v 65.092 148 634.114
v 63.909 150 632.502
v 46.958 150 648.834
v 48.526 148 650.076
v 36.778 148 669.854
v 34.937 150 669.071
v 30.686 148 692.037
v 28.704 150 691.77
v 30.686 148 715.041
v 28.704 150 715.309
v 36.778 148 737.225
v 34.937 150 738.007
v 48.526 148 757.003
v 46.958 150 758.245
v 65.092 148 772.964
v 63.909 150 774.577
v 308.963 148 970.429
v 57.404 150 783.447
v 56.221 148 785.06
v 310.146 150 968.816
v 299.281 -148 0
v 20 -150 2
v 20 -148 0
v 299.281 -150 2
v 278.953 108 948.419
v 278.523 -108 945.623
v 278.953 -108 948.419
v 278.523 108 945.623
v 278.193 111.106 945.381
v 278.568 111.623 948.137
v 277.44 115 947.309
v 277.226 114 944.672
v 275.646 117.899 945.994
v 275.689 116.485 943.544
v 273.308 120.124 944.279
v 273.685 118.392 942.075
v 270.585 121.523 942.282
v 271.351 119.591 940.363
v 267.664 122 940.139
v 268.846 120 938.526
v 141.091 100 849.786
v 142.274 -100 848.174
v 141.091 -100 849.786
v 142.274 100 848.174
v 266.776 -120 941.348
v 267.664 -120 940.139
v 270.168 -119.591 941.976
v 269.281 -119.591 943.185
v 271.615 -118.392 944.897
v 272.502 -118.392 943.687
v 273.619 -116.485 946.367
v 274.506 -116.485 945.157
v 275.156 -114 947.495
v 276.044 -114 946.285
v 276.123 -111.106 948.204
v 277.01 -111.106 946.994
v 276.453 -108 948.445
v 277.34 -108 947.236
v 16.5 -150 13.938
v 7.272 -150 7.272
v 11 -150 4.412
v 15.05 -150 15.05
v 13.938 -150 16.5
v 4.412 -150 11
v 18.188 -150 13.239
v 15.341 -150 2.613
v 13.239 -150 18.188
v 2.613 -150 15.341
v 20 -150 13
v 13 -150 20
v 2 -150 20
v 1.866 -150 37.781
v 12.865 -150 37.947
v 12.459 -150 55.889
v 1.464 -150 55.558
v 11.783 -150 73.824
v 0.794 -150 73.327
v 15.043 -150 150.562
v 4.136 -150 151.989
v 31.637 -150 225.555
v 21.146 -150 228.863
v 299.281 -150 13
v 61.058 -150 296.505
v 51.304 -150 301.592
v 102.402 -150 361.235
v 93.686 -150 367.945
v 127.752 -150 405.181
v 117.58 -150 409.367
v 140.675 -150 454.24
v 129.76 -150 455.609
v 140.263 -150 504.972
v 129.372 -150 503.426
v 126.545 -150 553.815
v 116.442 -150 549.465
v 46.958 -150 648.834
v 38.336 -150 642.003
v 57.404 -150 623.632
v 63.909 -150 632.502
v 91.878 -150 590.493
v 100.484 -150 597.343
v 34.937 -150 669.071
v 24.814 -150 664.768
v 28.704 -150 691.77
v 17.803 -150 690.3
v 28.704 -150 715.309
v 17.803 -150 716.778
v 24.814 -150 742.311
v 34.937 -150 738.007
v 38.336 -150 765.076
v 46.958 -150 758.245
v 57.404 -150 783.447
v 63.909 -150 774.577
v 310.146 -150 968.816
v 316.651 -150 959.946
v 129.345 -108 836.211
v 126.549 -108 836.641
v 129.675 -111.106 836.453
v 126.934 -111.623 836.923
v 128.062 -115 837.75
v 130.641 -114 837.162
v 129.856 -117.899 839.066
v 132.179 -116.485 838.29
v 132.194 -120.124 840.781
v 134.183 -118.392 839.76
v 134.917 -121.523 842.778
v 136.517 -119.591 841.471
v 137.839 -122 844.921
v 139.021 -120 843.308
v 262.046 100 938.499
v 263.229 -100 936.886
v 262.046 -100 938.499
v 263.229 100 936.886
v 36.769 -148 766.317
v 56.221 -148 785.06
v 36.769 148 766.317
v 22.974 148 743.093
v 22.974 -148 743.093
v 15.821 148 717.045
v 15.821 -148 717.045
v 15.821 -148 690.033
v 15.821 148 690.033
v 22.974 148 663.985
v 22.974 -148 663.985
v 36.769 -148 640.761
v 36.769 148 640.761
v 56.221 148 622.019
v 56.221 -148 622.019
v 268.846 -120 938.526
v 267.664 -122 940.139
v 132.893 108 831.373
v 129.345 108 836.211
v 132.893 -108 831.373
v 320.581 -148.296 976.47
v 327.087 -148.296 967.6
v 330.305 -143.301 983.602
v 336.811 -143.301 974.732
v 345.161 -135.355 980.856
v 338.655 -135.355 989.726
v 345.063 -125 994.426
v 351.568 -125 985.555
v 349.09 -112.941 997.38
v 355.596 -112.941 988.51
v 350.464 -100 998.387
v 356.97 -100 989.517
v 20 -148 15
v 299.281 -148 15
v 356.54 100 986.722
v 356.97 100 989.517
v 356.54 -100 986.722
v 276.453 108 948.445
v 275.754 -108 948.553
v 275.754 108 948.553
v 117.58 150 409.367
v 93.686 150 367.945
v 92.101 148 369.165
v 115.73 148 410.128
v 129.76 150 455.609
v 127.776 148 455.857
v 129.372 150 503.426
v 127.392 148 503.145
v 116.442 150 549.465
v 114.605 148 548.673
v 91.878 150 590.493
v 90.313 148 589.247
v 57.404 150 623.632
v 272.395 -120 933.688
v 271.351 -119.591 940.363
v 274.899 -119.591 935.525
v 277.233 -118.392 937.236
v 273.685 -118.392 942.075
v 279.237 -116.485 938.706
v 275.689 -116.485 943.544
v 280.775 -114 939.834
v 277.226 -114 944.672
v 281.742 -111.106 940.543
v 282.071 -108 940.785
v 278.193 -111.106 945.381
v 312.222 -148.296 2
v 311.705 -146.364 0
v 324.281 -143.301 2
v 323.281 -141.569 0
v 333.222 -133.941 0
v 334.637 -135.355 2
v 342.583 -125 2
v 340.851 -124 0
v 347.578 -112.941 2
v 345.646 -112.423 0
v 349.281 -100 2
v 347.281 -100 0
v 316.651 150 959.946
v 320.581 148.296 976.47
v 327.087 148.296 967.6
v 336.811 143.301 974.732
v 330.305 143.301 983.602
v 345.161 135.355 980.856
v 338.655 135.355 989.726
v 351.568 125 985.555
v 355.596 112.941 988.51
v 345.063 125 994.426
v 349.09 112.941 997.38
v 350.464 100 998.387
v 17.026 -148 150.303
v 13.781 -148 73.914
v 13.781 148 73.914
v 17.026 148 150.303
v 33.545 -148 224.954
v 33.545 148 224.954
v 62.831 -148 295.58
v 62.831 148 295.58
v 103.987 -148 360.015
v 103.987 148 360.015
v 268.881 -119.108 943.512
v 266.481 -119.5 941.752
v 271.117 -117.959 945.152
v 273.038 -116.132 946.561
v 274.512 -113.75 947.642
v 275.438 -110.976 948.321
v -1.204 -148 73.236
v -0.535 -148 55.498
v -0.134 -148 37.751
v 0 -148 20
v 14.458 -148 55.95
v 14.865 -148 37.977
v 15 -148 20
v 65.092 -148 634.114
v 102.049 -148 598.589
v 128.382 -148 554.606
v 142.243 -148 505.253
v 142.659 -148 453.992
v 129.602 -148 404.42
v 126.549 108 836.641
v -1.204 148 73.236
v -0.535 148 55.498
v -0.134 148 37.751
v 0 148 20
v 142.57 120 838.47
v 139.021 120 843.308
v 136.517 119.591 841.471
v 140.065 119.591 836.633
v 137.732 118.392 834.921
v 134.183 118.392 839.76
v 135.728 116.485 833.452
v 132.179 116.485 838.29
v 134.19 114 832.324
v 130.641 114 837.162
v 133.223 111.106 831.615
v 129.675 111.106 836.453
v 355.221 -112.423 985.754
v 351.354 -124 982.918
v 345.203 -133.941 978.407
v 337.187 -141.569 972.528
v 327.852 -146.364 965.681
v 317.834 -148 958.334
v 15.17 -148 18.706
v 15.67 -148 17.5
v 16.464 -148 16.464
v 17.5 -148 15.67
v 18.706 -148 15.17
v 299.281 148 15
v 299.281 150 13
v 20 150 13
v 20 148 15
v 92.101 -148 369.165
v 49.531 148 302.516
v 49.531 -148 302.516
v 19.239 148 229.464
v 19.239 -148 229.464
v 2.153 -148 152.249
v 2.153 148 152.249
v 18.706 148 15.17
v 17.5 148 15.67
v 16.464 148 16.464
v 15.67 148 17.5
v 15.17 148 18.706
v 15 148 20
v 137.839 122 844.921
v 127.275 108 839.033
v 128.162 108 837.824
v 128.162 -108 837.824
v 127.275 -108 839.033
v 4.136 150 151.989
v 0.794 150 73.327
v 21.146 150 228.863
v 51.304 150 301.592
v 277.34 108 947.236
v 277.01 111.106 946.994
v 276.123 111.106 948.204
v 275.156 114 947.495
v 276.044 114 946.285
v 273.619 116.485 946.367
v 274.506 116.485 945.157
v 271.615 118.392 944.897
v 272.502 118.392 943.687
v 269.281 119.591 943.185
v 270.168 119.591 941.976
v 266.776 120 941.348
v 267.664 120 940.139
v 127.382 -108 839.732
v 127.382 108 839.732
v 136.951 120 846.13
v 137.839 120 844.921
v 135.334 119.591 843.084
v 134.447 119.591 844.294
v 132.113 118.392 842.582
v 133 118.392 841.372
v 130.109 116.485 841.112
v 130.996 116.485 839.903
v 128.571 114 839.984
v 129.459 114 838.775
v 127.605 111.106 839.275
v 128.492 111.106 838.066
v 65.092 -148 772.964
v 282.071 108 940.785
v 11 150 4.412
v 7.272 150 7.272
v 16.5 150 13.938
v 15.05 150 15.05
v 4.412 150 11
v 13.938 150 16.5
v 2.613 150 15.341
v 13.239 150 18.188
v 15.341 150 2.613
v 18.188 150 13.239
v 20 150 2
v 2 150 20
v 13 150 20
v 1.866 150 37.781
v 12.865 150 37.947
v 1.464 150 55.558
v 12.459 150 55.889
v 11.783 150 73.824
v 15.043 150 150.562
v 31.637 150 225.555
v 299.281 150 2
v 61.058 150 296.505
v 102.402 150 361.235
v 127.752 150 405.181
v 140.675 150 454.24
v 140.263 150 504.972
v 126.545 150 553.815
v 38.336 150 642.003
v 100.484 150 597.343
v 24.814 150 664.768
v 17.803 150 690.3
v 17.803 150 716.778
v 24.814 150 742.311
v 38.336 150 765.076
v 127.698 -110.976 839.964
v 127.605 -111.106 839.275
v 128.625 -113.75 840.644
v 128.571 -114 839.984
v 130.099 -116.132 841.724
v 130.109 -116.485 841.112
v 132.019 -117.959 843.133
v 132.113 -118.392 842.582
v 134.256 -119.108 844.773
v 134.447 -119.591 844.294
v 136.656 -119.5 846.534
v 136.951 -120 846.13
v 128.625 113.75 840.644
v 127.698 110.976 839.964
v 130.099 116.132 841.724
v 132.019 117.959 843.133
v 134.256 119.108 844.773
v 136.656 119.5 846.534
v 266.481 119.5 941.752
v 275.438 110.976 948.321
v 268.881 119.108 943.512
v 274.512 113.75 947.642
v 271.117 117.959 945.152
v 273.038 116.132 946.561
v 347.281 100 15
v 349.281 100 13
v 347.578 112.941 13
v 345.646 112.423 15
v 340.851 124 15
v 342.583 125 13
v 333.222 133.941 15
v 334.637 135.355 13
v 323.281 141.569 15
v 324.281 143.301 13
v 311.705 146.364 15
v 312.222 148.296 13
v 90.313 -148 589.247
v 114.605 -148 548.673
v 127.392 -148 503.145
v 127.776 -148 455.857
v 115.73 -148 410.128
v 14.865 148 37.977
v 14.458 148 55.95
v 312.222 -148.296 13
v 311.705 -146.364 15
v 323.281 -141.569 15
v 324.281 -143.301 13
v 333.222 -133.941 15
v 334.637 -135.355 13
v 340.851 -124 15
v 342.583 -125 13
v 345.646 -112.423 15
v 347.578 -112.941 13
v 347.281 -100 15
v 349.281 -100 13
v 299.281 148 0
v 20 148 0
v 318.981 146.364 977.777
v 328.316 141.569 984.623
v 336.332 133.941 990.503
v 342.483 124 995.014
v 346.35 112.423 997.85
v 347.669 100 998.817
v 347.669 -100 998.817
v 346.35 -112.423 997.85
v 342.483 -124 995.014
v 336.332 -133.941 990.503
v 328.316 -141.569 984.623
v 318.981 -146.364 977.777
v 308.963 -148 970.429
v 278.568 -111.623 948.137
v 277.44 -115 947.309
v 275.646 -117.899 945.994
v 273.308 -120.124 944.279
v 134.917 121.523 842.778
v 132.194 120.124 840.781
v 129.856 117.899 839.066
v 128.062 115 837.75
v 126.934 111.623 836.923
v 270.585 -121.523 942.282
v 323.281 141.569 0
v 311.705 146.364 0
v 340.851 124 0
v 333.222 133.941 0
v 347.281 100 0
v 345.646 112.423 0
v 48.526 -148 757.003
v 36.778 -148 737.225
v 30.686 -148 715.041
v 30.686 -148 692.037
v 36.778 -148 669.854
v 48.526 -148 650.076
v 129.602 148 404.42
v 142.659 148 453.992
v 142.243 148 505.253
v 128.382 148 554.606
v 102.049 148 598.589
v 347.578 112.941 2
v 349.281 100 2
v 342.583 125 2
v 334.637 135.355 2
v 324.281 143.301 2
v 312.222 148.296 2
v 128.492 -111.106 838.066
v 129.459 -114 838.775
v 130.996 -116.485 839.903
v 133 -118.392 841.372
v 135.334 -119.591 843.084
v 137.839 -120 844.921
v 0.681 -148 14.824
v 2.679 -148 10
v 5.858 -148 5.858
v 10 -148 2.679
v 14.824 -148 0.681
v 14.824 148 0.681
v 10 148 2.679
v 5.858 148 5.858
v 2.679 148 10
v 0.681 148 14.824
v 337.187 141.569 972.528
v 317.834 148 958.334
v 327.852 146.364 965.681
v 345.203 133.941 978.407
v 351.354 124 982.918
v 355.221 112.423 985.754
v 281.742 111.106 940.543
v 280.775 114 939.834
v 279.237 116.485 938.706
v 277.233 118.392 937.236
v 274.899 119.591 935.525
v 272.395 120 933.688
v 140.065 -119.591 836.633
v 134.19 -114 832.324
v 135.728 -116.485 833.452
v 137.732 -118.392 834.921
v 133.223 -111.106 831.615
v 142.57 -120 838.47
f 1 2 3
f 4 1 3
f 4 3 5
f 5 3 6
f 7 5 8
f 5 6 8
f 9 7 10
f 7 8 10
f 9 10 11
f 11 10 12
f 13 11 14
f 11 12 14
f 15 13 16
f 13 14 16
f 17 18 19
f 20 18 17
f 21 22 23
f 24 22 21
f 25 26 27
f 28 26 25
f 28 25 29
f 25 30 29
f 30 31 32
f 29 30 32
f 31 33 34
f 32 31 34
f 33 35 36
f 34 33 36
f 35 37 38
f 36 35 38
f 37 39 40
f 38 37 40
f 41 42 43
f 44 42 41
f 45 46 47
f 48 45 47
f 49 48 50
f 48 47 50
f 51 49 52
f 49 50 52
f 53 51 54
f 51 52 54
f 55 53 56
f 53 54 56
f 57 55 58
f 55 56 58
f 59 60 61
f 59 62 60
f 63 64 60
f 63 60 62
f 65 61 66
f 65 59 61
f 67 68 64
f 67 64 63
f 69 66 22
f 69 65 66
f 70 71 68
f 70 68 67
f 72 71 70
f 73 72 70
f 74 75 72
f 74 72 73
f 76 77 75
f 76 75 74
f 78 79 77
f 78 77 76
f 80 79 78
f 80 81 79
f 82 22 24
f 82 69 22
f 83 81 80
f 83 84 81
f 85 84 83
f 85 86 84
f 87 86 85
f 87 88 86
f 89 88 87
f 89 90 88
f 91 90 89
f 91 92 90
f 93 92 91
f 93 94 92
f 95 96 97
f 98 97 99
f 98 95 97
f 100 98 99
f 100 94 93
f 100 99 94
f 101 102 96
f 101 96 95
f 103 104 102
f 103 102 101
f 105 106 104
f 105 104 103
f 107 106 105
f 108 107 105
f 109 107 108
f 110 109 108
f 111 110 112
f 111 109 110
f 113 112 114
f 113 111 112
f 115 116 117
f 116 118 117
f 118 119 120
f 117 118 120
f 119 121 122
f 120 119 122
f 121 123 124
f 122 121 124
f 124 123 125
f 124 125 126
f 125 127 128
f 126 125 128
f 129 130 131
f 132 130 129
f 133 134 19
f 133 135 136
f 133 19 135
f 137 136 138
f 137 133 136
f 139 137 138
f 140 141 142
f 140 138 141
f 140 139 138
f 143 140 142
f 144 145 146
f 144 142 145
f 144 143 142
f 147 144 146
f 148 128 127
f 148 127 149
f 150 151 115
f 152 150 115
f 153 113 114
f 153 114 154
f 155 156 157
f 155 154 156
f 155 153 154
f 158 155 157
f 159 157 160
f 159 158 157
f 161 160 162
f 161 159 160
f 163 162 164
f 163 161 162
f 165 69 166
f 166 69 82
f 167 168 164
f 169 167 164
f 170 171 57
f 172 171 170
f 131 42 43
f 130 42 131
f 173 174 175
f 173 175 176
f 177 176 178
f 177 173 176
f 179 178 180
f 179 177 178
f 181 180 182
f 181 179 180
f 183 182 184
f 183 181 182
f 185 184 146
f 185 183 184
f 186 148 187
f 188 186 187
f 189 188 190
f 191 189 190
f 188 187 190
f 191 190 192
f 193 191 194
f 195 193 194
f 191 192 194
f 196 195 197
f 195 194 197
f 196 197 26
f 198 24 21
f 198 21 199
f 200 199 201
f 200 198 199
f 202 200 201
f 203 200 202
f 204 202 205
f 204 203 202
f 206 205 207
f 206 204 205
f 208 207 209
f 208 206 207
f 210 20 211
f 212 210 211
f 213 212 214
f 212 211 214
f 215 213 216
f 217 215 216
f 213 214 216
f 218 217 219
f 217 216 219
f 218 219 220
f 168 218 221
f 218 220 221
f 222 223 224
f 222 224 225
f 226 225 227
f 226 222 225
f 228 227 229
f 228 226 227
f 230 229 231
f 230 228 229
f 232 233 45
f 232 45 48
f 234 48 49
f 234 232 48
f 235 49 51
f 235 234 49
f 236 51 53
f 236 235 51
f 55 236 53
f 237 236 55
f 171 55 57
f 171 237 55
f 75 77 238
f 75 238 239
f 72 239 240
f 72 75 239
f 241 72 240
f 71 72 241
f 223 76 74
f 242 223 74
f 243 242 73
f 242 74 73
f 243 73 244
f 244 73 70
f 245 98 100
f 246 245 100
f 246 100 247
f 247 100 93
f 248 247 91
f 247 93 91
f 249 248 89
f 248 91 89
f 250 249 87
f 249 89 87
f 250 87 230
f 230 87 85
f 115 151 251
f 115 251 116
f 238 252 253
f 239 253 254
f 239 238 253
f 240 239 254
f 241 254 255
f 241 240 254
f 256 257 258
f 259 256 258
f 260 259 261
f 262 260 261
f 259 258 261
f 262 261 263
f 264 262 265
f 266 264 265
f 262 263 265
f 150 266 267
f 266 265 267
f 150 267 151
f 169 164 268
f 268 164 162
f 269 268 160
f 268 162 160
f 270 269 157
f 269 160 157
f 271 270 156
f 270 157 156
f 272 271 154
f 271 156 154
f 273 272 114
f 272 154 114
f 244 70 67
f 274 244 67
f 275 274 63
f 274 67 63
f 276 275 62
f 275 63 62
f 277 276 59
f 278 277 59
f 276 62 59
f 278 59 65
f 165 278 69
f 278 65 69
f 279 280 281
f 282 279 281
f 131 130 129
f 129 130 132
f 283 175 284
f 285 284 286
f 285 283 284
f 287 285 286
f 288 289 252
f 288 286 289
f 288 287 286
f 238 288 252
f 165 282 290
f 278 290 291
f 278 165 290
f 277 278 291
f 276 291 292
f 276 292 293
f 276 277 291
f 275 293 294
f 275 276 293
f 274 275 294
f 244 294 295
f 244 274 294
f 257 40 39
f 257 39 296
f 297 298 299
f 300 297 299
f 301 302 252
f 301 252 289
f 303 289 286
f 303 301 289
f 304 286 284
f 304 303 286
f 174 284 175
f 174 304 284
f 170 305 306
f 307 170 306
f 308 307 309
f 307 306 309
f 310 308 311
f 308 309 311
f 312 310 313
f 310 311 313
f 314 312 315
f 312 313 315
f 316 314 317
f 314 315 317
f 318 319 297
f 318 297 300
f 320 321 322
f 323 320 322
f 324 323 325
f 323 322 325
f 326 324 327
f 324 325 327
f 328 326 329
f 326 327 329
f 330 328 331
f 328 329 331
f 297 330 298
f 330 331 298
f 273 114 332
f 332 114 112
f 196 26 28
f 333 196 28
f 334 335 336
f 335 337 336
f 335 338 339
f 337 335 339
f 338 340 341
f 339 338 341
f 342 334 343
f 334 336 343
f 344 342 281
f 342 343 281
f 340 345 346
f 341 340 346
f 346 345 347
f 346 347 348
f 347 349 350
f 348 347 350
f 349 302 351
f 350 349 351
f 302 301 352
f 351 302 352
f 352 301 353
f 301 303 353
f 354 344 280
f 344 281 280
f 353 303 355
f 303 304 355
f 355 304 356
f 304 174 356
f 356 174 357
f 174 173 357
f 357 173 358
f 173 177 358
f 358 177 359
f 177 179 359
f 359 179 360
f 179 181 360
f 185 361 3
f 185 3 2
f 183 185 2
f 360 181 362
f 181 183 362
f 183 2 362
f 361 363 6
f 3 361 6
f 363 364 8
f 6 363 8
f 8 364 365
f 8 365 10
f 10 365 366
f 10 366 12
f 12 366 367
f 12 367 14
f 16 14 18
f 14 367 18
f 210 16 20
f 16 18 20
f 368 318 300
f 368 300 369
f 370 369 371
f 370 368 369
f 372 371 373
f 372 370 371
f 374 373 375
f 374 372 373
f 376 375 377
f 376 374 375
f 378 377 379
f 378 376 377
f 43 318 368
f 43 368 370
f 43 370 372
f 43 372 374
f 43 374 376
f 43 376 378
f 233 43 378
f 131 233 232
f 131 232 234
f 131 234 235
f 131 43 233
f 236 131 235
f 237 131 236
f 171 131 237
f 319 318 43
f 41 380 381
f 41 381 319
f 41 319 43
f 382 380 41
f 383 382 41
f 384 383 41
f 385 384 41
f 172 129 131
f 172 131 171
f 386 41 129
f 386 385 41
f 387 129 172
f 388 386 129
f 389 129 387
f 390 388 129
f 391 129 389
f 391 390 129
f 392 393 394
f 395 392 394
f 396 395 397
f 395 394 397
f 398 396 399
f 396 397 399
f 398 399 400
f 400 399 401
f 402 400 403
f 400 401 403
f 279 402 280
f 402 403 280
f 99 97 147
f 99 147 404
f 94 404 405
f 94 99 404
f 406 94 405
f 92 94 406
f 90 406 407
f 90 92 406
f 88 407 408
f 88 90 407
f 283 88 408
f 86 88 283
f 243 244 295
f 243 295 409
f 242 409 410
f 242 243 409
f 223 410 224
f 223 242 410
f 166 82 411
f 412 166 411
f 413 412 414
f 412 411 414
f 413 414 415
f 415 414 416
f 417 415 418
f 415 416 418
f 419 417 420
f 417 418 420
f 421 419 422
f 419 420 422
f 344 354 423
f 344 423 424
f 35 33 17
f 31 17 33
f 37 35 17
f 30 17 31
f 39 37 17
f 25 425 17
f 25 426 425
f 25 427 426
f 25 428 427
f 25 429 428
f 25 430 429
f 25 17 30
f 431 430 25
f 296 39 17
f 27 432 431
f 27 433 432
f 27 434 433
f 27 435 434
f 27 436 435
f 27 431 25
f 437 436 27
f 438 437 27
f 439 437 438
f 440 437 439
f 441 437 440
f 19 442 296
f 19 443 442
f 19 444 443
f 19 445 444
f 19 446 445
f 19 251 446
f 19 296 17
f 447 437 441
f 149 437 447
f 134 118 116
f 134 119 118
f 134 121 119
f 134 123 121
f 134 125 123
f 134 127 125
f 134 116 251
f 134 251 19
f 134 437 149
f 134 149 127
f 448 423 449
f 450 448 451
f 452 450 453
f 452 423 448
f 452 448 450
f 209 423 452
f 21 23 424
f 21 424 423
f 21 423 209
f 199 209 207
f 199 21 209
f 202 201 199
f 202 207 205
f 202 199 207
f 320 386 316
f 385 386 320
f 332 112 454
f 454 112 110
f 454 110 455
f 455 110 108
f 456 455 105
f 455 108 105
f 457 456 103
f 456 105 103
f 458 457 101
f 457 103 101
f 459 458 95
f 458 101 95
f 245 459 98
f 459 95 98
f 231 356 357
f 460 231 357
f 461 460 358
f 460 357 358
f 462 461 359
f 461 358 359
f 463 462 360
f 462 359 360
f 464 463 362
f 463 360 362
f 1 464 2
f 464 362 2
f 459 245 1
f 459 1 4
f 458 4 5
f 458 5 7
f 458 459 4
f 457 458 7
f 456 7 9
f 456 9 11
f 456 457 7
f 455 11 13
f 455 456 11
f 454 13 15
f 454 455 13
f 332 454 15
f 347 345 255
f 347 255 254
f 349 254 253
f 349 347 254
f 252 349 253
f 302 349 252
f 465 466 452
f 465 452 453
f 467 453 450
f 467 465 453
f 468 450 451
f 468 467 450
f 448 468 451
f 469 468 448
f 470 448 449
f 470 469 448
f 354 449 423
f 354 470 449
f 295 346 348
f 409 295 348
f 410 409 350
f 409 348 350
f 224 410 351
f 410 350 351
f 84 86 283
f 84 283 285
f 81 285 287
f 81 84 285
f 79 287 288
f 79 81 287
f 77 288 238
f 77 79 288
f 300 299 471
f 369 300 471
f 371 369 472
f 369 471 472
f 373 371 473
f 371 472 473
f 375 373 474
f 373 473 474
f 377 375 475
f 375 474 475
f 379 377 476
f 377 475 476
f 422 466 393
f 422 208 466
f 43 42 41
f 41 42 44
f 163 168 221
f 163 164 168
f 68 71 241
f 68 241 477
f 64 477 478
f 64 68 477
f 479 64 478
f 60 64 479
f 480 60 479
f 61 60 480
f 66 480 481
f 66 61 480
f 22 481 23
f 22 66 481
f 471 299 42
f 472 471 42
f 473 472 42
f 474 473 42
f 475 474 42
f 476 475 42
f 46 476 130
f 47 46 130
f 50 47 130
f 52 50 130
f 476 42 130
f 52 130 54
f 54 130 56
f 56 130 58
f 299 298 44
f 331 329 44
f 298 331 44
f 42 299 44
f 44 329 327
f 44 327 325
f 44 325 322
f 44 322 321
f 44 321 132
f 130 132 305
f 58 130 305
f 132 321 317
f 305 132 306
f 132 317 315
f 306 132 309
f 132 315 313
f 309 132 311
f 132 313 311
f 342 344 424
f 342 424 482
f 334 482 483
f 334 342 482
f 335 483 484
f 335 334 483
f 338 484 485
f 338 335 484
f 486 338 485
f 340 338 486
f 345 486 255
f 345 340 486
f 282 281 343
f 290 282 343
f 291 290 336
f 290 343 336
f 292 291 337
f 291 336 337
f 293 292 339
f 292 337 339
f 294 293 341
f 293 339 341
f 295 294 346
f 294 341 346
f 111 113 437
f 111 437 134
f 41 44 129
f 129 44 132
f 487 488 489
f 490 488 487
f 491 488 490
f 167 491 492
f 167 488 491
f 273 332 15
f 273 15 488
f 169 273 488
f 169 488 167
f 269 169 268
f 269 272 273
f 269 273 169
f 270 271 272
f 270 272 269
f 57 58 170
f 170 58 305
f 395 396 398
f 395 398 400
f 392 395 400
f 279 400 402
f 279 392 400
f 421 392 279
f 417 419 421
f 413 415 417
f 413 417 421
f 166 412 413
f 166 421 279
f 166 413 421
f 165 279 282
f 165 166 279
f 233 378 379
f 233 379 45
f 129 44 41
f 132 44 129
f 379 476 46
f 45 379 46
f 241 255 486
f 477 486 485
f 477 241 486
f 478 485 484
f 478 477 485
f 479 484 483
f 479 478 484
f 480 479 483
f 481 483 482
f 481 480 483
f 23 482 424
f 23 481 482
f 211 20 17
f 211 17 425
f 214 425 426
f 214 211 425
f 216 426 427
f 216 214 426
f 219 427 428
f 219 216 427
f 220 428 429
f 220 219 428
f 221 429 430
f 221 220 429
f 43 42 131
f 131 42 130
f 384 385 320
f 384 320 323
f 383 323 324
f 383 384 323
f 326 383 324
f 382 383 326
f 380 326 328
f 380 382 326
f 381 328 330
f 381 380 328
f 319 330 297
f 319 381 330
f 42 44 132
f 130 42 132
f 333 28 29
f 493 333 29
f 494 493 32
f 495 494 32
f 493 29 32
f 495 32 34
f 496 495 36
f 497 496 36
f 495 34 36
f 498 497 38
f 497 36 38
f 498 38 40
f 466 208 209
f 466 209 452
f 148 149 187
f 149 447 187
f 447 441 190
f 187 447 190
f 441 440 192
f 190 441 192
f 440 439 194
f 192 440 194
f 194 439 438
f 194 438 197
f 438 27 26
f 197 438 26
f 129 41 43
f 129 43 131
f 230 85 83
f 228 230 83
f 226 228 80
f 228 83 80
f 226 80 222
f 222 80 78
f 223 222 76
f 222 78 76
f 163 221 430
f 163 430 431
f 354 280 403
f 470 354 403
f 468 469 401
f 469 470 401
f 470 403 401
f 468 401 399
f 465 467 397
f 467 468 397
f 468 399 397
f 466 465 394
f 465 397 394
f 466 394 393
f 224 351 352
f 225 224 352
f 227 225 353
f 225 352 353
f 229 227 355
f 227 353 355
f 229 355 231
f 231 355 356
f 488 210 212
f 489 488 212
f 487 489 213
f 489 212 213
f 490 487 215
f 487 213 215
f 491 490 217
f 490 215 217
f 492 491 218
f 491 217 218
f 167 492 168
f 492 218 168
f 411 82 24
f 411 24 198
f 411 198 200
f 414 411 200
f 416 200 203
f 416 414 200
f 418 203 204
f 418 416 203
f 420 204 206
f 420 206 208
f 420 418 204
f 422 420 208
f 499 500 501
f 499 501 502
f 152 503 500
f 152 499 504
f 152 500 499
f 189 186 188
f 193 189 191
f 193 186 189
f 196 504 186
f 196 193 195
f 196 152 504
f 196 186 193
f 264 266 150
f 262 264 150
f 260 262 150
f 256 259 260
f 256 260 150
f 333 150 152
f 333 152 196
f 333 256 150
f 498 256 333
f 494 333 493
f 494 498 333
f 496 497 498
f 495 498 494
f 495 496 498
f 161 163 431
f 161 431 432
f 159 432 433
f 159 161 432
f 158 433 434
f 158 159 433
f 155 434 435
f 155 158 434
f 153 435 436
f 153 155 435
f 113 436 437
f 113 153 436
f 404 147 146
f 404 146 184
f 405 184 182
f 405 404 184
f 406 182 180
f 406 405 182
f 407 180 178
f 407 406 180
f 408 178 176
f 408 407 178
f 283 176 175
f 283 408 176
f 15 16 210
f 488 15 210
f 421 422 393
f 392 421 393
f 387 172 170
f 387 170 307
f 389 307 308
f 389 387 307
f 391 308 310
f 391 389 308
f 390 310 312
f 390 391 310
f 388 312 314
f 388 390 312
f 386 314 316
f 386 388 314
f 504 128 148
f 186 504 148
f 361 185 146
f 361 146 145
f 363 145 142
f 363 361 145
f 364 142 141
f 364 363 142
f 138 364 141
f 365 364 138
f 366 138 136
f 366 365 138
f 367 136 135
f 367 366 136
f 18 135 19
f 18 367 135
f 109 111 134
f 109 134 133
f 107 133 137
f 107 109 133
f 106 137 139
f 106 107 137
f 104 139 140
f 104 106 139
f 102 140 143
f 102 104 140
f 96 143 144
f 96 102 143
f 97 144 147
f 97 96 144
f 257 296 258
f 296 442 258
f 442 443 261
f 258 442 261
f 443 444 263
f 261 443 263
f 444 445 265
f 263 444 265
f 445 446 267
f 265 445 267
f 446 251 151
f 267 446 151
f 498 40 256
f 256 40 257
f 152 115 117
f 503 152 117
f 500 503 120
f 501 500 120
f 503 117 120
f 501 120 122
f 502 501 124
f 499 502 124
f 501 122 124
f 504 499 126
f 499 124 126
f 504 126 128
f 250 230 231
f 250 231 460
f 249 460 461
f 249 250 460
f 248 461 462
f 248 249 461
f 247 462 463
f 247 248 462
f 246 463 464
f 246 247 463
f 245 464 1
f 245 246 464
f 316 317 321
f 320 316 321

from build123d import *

# Parameters (mm, degrees)
F1_DEPTH = 150
F2_W     = 150
F2_H     = 200
F3_DEPTH = 8
F4_DEPTH = 2
F5_DEPTH = 2
F6_SIZE  = 0.5
F7_R     = 50
F8_SIZE  = 2


with BuildPart() as f1:
    # F0 (on Front) → F1 (new body, symmetric)
    with BuildSketch(Plane.XZ):
        with BuildLine():
            ThreePointArc((0, 20), (5.8578643763, 5.8578643763), (20, 0))
            Line((20, 0), (349.2813145287, 0))
            Line((349.2813145287, 0), (349.2813145287, 15))
            Line((349.2813145287, 15), (20, 15))
            ThreePointArc((20, 15), (16.4644660941, 16.4644660941), (15, 20))
            ThreePointArc((15, 20), (14.6952395355, 46.9639715527), (13.7811138505, 73.9141666367))
            ThreePointArc((13.7811138505, 73.9141666367), (33.5445295719, 224.9539574175), (103.9868612693, 360.0150136294))
            ThreePointArc((103.9868612693, 360.0150136294), (142.242823173, 505.2528295697), (65.0920324936, 634.1143726997))
            ThreePointArc((65.0920324936, 634.1143726997), (29.9146009128, 703.5392819502), (65.0920324936, 772.9641912008))
            Line((65.0920324936, 772.9641912008), (358.1525547883, 987.9045009919))
            Line((358.1525547883, 987.9045009919), (349.2813145287, 1000))
            Line((349.2813145287, 1000), (56.2207922339, 785.0596902089))
            ThreePointArc((56.2207922339, 785.0596902089), (14.9146009128, 703.5392819502), (56.2207922339, 622.0188736916))
            ThreePointArc((56.2207922339, 622.0188736916), (127.3915982157, 503.1454337196), (92.1008692639, 369.1650515553))
            ThreePointArc((92.1008692639, 369.1650515553), (19.2387537556, 229.4644760457), (-1.2035604669, 73.236276084))
            ThreePointArc((-1.2035604669, 73.236276084), (-0.3009285544, 46.624939667), (0, 20))
        make_face()
    extrude(amount=F1_DEPTH, both=True)

    # F2 (on face) → F3 (cut)
    with BuildSketch(Plane(origin=(-354.7289831539, 0, 483.6554910394), x_dir=(0.8063666005, 0, 0.5914160173), z_dir=(-0.5914160173, 0, 0.8063666005))):
        with BuildLine():
            Line((598.8481239922, 108), (598.8481239922, -108))
            ThreePointArc((598.8481239922, -108), (602.3628426179, -116.4852813742), (610.8481239922, -120))
            Line((610.8481239922, -120), (771.8481239922, -120))
            ThreePointArc((771.8481239922, -120), (780.3334053664, -116.4852813742), (783.8481239922, -108))
            Line((783.8481239922, -108), (783.8481239922, 108))
            ThreePointArc((783.8481239922, 108), (780.3334053664, 116.4852813742), (771.8481239922, 120))
            Line((771.8481239922, 120), (610.8481239922, 120))
            ThreePointArc((610.8481239922, 120), (602.3628426179, 116.4852813742), (598.8481239922, 108))
        make_face()
        with Locations((691.3481239922, 0)):
            Rectangle(F2_W, F2_H, mode=Mode.SUBTRACT)
        with Locations((691.3481239922, 0)):
            Rectangle(F2_W, F2_H)
    extrude(amount=-F3_DEPTH, mode=Mode.SUBTRACT)

    # F7
    f7_edges = [f1.edges().sort_by_distance(p)[0] for p in [
        (353.716935, -150, 993.95225),
        (353.716935, 150, 993.95225),
        (349.281315, -150, 7.5),
        (349.281315, 150, 7.5),
    ]]
    fillet(f7_edges, radius=F7_R)

    # F8
    f8_edges = [f1.edges().sort_by_distance(p)[0] for p in [
        (349.281315, 0, 1000),
        (202.751053, -120, 892.529845),
        (358.152555, 0, 987.904501),
    ]]
    chamfer(f8_edges, length=F8_SIZE)


with BuildPart() as f4:
    # F2 (on face) → F4 (new body)
    with BuildSketch(Plane(origin=(-354.7289831539, 0, 483.6554910394), x_dir=(0.8063666005, 0, 0.5914160173), z_dir=(-0.5914160173, 0, 0.8063666005))):
        with BuildLine():
            Line((598.8481239922, 108), (598.8481239922, -108))
            ThreePointArc((598.8481239922, -108), (602.3628426179, -116.4852813742), (610.8481239922, -120))
            Line((610.8481239922, -120), (771.8481239922, -120))
            ThreePointArc((771.8481239922, -120), (780.3334053664, -116.4852813742), (783.8481239922, -108))
            Line((783.8481239922, -108), (783.8481239922, 108))
            ThreePointArc((783.8481239922, 108), (780.3334053664, 116.4852813742), (771.8481239922, 120))
            Line((771.8481239922, 120), (610.8481239922, 120))
            ThreePointArc((610.8481239922, 120), (602.3628426179, 116.4852813742), (598.8481239922, 108))
        make_face()
        with Locations((691.3481239922, 0)):
            Rectangle(F2_W, F2_H, mode=Mode.SUBTRACT)
    extrude(amount=F4_DEPTH)

    # F6
    f6_edges = [f4.edges().sort_by_distance(p)[0] for p in [
        (201.568221, -120, 894.142578),
    ]]
    chamfer(f6_edges, length=F6_SIZE)


with BuildPart() as f5:
    # F2 (on face) → F5 (new body)
    with BuildSketch(Plane(origin=(-354.7289831539, 0, 483.6554910394), x_dir=(0.8063666005, 0, 0.5914160173), z_dir=(-0.5914160173, 0, 0.8063666005))):
        with Locations((691.3481239922, 0)):
            Rectangle(F2_W, F2_H)
    extrude(amount=F5_DEPTH)


solid = Compound([f1.part, f4.part, f5.part])
